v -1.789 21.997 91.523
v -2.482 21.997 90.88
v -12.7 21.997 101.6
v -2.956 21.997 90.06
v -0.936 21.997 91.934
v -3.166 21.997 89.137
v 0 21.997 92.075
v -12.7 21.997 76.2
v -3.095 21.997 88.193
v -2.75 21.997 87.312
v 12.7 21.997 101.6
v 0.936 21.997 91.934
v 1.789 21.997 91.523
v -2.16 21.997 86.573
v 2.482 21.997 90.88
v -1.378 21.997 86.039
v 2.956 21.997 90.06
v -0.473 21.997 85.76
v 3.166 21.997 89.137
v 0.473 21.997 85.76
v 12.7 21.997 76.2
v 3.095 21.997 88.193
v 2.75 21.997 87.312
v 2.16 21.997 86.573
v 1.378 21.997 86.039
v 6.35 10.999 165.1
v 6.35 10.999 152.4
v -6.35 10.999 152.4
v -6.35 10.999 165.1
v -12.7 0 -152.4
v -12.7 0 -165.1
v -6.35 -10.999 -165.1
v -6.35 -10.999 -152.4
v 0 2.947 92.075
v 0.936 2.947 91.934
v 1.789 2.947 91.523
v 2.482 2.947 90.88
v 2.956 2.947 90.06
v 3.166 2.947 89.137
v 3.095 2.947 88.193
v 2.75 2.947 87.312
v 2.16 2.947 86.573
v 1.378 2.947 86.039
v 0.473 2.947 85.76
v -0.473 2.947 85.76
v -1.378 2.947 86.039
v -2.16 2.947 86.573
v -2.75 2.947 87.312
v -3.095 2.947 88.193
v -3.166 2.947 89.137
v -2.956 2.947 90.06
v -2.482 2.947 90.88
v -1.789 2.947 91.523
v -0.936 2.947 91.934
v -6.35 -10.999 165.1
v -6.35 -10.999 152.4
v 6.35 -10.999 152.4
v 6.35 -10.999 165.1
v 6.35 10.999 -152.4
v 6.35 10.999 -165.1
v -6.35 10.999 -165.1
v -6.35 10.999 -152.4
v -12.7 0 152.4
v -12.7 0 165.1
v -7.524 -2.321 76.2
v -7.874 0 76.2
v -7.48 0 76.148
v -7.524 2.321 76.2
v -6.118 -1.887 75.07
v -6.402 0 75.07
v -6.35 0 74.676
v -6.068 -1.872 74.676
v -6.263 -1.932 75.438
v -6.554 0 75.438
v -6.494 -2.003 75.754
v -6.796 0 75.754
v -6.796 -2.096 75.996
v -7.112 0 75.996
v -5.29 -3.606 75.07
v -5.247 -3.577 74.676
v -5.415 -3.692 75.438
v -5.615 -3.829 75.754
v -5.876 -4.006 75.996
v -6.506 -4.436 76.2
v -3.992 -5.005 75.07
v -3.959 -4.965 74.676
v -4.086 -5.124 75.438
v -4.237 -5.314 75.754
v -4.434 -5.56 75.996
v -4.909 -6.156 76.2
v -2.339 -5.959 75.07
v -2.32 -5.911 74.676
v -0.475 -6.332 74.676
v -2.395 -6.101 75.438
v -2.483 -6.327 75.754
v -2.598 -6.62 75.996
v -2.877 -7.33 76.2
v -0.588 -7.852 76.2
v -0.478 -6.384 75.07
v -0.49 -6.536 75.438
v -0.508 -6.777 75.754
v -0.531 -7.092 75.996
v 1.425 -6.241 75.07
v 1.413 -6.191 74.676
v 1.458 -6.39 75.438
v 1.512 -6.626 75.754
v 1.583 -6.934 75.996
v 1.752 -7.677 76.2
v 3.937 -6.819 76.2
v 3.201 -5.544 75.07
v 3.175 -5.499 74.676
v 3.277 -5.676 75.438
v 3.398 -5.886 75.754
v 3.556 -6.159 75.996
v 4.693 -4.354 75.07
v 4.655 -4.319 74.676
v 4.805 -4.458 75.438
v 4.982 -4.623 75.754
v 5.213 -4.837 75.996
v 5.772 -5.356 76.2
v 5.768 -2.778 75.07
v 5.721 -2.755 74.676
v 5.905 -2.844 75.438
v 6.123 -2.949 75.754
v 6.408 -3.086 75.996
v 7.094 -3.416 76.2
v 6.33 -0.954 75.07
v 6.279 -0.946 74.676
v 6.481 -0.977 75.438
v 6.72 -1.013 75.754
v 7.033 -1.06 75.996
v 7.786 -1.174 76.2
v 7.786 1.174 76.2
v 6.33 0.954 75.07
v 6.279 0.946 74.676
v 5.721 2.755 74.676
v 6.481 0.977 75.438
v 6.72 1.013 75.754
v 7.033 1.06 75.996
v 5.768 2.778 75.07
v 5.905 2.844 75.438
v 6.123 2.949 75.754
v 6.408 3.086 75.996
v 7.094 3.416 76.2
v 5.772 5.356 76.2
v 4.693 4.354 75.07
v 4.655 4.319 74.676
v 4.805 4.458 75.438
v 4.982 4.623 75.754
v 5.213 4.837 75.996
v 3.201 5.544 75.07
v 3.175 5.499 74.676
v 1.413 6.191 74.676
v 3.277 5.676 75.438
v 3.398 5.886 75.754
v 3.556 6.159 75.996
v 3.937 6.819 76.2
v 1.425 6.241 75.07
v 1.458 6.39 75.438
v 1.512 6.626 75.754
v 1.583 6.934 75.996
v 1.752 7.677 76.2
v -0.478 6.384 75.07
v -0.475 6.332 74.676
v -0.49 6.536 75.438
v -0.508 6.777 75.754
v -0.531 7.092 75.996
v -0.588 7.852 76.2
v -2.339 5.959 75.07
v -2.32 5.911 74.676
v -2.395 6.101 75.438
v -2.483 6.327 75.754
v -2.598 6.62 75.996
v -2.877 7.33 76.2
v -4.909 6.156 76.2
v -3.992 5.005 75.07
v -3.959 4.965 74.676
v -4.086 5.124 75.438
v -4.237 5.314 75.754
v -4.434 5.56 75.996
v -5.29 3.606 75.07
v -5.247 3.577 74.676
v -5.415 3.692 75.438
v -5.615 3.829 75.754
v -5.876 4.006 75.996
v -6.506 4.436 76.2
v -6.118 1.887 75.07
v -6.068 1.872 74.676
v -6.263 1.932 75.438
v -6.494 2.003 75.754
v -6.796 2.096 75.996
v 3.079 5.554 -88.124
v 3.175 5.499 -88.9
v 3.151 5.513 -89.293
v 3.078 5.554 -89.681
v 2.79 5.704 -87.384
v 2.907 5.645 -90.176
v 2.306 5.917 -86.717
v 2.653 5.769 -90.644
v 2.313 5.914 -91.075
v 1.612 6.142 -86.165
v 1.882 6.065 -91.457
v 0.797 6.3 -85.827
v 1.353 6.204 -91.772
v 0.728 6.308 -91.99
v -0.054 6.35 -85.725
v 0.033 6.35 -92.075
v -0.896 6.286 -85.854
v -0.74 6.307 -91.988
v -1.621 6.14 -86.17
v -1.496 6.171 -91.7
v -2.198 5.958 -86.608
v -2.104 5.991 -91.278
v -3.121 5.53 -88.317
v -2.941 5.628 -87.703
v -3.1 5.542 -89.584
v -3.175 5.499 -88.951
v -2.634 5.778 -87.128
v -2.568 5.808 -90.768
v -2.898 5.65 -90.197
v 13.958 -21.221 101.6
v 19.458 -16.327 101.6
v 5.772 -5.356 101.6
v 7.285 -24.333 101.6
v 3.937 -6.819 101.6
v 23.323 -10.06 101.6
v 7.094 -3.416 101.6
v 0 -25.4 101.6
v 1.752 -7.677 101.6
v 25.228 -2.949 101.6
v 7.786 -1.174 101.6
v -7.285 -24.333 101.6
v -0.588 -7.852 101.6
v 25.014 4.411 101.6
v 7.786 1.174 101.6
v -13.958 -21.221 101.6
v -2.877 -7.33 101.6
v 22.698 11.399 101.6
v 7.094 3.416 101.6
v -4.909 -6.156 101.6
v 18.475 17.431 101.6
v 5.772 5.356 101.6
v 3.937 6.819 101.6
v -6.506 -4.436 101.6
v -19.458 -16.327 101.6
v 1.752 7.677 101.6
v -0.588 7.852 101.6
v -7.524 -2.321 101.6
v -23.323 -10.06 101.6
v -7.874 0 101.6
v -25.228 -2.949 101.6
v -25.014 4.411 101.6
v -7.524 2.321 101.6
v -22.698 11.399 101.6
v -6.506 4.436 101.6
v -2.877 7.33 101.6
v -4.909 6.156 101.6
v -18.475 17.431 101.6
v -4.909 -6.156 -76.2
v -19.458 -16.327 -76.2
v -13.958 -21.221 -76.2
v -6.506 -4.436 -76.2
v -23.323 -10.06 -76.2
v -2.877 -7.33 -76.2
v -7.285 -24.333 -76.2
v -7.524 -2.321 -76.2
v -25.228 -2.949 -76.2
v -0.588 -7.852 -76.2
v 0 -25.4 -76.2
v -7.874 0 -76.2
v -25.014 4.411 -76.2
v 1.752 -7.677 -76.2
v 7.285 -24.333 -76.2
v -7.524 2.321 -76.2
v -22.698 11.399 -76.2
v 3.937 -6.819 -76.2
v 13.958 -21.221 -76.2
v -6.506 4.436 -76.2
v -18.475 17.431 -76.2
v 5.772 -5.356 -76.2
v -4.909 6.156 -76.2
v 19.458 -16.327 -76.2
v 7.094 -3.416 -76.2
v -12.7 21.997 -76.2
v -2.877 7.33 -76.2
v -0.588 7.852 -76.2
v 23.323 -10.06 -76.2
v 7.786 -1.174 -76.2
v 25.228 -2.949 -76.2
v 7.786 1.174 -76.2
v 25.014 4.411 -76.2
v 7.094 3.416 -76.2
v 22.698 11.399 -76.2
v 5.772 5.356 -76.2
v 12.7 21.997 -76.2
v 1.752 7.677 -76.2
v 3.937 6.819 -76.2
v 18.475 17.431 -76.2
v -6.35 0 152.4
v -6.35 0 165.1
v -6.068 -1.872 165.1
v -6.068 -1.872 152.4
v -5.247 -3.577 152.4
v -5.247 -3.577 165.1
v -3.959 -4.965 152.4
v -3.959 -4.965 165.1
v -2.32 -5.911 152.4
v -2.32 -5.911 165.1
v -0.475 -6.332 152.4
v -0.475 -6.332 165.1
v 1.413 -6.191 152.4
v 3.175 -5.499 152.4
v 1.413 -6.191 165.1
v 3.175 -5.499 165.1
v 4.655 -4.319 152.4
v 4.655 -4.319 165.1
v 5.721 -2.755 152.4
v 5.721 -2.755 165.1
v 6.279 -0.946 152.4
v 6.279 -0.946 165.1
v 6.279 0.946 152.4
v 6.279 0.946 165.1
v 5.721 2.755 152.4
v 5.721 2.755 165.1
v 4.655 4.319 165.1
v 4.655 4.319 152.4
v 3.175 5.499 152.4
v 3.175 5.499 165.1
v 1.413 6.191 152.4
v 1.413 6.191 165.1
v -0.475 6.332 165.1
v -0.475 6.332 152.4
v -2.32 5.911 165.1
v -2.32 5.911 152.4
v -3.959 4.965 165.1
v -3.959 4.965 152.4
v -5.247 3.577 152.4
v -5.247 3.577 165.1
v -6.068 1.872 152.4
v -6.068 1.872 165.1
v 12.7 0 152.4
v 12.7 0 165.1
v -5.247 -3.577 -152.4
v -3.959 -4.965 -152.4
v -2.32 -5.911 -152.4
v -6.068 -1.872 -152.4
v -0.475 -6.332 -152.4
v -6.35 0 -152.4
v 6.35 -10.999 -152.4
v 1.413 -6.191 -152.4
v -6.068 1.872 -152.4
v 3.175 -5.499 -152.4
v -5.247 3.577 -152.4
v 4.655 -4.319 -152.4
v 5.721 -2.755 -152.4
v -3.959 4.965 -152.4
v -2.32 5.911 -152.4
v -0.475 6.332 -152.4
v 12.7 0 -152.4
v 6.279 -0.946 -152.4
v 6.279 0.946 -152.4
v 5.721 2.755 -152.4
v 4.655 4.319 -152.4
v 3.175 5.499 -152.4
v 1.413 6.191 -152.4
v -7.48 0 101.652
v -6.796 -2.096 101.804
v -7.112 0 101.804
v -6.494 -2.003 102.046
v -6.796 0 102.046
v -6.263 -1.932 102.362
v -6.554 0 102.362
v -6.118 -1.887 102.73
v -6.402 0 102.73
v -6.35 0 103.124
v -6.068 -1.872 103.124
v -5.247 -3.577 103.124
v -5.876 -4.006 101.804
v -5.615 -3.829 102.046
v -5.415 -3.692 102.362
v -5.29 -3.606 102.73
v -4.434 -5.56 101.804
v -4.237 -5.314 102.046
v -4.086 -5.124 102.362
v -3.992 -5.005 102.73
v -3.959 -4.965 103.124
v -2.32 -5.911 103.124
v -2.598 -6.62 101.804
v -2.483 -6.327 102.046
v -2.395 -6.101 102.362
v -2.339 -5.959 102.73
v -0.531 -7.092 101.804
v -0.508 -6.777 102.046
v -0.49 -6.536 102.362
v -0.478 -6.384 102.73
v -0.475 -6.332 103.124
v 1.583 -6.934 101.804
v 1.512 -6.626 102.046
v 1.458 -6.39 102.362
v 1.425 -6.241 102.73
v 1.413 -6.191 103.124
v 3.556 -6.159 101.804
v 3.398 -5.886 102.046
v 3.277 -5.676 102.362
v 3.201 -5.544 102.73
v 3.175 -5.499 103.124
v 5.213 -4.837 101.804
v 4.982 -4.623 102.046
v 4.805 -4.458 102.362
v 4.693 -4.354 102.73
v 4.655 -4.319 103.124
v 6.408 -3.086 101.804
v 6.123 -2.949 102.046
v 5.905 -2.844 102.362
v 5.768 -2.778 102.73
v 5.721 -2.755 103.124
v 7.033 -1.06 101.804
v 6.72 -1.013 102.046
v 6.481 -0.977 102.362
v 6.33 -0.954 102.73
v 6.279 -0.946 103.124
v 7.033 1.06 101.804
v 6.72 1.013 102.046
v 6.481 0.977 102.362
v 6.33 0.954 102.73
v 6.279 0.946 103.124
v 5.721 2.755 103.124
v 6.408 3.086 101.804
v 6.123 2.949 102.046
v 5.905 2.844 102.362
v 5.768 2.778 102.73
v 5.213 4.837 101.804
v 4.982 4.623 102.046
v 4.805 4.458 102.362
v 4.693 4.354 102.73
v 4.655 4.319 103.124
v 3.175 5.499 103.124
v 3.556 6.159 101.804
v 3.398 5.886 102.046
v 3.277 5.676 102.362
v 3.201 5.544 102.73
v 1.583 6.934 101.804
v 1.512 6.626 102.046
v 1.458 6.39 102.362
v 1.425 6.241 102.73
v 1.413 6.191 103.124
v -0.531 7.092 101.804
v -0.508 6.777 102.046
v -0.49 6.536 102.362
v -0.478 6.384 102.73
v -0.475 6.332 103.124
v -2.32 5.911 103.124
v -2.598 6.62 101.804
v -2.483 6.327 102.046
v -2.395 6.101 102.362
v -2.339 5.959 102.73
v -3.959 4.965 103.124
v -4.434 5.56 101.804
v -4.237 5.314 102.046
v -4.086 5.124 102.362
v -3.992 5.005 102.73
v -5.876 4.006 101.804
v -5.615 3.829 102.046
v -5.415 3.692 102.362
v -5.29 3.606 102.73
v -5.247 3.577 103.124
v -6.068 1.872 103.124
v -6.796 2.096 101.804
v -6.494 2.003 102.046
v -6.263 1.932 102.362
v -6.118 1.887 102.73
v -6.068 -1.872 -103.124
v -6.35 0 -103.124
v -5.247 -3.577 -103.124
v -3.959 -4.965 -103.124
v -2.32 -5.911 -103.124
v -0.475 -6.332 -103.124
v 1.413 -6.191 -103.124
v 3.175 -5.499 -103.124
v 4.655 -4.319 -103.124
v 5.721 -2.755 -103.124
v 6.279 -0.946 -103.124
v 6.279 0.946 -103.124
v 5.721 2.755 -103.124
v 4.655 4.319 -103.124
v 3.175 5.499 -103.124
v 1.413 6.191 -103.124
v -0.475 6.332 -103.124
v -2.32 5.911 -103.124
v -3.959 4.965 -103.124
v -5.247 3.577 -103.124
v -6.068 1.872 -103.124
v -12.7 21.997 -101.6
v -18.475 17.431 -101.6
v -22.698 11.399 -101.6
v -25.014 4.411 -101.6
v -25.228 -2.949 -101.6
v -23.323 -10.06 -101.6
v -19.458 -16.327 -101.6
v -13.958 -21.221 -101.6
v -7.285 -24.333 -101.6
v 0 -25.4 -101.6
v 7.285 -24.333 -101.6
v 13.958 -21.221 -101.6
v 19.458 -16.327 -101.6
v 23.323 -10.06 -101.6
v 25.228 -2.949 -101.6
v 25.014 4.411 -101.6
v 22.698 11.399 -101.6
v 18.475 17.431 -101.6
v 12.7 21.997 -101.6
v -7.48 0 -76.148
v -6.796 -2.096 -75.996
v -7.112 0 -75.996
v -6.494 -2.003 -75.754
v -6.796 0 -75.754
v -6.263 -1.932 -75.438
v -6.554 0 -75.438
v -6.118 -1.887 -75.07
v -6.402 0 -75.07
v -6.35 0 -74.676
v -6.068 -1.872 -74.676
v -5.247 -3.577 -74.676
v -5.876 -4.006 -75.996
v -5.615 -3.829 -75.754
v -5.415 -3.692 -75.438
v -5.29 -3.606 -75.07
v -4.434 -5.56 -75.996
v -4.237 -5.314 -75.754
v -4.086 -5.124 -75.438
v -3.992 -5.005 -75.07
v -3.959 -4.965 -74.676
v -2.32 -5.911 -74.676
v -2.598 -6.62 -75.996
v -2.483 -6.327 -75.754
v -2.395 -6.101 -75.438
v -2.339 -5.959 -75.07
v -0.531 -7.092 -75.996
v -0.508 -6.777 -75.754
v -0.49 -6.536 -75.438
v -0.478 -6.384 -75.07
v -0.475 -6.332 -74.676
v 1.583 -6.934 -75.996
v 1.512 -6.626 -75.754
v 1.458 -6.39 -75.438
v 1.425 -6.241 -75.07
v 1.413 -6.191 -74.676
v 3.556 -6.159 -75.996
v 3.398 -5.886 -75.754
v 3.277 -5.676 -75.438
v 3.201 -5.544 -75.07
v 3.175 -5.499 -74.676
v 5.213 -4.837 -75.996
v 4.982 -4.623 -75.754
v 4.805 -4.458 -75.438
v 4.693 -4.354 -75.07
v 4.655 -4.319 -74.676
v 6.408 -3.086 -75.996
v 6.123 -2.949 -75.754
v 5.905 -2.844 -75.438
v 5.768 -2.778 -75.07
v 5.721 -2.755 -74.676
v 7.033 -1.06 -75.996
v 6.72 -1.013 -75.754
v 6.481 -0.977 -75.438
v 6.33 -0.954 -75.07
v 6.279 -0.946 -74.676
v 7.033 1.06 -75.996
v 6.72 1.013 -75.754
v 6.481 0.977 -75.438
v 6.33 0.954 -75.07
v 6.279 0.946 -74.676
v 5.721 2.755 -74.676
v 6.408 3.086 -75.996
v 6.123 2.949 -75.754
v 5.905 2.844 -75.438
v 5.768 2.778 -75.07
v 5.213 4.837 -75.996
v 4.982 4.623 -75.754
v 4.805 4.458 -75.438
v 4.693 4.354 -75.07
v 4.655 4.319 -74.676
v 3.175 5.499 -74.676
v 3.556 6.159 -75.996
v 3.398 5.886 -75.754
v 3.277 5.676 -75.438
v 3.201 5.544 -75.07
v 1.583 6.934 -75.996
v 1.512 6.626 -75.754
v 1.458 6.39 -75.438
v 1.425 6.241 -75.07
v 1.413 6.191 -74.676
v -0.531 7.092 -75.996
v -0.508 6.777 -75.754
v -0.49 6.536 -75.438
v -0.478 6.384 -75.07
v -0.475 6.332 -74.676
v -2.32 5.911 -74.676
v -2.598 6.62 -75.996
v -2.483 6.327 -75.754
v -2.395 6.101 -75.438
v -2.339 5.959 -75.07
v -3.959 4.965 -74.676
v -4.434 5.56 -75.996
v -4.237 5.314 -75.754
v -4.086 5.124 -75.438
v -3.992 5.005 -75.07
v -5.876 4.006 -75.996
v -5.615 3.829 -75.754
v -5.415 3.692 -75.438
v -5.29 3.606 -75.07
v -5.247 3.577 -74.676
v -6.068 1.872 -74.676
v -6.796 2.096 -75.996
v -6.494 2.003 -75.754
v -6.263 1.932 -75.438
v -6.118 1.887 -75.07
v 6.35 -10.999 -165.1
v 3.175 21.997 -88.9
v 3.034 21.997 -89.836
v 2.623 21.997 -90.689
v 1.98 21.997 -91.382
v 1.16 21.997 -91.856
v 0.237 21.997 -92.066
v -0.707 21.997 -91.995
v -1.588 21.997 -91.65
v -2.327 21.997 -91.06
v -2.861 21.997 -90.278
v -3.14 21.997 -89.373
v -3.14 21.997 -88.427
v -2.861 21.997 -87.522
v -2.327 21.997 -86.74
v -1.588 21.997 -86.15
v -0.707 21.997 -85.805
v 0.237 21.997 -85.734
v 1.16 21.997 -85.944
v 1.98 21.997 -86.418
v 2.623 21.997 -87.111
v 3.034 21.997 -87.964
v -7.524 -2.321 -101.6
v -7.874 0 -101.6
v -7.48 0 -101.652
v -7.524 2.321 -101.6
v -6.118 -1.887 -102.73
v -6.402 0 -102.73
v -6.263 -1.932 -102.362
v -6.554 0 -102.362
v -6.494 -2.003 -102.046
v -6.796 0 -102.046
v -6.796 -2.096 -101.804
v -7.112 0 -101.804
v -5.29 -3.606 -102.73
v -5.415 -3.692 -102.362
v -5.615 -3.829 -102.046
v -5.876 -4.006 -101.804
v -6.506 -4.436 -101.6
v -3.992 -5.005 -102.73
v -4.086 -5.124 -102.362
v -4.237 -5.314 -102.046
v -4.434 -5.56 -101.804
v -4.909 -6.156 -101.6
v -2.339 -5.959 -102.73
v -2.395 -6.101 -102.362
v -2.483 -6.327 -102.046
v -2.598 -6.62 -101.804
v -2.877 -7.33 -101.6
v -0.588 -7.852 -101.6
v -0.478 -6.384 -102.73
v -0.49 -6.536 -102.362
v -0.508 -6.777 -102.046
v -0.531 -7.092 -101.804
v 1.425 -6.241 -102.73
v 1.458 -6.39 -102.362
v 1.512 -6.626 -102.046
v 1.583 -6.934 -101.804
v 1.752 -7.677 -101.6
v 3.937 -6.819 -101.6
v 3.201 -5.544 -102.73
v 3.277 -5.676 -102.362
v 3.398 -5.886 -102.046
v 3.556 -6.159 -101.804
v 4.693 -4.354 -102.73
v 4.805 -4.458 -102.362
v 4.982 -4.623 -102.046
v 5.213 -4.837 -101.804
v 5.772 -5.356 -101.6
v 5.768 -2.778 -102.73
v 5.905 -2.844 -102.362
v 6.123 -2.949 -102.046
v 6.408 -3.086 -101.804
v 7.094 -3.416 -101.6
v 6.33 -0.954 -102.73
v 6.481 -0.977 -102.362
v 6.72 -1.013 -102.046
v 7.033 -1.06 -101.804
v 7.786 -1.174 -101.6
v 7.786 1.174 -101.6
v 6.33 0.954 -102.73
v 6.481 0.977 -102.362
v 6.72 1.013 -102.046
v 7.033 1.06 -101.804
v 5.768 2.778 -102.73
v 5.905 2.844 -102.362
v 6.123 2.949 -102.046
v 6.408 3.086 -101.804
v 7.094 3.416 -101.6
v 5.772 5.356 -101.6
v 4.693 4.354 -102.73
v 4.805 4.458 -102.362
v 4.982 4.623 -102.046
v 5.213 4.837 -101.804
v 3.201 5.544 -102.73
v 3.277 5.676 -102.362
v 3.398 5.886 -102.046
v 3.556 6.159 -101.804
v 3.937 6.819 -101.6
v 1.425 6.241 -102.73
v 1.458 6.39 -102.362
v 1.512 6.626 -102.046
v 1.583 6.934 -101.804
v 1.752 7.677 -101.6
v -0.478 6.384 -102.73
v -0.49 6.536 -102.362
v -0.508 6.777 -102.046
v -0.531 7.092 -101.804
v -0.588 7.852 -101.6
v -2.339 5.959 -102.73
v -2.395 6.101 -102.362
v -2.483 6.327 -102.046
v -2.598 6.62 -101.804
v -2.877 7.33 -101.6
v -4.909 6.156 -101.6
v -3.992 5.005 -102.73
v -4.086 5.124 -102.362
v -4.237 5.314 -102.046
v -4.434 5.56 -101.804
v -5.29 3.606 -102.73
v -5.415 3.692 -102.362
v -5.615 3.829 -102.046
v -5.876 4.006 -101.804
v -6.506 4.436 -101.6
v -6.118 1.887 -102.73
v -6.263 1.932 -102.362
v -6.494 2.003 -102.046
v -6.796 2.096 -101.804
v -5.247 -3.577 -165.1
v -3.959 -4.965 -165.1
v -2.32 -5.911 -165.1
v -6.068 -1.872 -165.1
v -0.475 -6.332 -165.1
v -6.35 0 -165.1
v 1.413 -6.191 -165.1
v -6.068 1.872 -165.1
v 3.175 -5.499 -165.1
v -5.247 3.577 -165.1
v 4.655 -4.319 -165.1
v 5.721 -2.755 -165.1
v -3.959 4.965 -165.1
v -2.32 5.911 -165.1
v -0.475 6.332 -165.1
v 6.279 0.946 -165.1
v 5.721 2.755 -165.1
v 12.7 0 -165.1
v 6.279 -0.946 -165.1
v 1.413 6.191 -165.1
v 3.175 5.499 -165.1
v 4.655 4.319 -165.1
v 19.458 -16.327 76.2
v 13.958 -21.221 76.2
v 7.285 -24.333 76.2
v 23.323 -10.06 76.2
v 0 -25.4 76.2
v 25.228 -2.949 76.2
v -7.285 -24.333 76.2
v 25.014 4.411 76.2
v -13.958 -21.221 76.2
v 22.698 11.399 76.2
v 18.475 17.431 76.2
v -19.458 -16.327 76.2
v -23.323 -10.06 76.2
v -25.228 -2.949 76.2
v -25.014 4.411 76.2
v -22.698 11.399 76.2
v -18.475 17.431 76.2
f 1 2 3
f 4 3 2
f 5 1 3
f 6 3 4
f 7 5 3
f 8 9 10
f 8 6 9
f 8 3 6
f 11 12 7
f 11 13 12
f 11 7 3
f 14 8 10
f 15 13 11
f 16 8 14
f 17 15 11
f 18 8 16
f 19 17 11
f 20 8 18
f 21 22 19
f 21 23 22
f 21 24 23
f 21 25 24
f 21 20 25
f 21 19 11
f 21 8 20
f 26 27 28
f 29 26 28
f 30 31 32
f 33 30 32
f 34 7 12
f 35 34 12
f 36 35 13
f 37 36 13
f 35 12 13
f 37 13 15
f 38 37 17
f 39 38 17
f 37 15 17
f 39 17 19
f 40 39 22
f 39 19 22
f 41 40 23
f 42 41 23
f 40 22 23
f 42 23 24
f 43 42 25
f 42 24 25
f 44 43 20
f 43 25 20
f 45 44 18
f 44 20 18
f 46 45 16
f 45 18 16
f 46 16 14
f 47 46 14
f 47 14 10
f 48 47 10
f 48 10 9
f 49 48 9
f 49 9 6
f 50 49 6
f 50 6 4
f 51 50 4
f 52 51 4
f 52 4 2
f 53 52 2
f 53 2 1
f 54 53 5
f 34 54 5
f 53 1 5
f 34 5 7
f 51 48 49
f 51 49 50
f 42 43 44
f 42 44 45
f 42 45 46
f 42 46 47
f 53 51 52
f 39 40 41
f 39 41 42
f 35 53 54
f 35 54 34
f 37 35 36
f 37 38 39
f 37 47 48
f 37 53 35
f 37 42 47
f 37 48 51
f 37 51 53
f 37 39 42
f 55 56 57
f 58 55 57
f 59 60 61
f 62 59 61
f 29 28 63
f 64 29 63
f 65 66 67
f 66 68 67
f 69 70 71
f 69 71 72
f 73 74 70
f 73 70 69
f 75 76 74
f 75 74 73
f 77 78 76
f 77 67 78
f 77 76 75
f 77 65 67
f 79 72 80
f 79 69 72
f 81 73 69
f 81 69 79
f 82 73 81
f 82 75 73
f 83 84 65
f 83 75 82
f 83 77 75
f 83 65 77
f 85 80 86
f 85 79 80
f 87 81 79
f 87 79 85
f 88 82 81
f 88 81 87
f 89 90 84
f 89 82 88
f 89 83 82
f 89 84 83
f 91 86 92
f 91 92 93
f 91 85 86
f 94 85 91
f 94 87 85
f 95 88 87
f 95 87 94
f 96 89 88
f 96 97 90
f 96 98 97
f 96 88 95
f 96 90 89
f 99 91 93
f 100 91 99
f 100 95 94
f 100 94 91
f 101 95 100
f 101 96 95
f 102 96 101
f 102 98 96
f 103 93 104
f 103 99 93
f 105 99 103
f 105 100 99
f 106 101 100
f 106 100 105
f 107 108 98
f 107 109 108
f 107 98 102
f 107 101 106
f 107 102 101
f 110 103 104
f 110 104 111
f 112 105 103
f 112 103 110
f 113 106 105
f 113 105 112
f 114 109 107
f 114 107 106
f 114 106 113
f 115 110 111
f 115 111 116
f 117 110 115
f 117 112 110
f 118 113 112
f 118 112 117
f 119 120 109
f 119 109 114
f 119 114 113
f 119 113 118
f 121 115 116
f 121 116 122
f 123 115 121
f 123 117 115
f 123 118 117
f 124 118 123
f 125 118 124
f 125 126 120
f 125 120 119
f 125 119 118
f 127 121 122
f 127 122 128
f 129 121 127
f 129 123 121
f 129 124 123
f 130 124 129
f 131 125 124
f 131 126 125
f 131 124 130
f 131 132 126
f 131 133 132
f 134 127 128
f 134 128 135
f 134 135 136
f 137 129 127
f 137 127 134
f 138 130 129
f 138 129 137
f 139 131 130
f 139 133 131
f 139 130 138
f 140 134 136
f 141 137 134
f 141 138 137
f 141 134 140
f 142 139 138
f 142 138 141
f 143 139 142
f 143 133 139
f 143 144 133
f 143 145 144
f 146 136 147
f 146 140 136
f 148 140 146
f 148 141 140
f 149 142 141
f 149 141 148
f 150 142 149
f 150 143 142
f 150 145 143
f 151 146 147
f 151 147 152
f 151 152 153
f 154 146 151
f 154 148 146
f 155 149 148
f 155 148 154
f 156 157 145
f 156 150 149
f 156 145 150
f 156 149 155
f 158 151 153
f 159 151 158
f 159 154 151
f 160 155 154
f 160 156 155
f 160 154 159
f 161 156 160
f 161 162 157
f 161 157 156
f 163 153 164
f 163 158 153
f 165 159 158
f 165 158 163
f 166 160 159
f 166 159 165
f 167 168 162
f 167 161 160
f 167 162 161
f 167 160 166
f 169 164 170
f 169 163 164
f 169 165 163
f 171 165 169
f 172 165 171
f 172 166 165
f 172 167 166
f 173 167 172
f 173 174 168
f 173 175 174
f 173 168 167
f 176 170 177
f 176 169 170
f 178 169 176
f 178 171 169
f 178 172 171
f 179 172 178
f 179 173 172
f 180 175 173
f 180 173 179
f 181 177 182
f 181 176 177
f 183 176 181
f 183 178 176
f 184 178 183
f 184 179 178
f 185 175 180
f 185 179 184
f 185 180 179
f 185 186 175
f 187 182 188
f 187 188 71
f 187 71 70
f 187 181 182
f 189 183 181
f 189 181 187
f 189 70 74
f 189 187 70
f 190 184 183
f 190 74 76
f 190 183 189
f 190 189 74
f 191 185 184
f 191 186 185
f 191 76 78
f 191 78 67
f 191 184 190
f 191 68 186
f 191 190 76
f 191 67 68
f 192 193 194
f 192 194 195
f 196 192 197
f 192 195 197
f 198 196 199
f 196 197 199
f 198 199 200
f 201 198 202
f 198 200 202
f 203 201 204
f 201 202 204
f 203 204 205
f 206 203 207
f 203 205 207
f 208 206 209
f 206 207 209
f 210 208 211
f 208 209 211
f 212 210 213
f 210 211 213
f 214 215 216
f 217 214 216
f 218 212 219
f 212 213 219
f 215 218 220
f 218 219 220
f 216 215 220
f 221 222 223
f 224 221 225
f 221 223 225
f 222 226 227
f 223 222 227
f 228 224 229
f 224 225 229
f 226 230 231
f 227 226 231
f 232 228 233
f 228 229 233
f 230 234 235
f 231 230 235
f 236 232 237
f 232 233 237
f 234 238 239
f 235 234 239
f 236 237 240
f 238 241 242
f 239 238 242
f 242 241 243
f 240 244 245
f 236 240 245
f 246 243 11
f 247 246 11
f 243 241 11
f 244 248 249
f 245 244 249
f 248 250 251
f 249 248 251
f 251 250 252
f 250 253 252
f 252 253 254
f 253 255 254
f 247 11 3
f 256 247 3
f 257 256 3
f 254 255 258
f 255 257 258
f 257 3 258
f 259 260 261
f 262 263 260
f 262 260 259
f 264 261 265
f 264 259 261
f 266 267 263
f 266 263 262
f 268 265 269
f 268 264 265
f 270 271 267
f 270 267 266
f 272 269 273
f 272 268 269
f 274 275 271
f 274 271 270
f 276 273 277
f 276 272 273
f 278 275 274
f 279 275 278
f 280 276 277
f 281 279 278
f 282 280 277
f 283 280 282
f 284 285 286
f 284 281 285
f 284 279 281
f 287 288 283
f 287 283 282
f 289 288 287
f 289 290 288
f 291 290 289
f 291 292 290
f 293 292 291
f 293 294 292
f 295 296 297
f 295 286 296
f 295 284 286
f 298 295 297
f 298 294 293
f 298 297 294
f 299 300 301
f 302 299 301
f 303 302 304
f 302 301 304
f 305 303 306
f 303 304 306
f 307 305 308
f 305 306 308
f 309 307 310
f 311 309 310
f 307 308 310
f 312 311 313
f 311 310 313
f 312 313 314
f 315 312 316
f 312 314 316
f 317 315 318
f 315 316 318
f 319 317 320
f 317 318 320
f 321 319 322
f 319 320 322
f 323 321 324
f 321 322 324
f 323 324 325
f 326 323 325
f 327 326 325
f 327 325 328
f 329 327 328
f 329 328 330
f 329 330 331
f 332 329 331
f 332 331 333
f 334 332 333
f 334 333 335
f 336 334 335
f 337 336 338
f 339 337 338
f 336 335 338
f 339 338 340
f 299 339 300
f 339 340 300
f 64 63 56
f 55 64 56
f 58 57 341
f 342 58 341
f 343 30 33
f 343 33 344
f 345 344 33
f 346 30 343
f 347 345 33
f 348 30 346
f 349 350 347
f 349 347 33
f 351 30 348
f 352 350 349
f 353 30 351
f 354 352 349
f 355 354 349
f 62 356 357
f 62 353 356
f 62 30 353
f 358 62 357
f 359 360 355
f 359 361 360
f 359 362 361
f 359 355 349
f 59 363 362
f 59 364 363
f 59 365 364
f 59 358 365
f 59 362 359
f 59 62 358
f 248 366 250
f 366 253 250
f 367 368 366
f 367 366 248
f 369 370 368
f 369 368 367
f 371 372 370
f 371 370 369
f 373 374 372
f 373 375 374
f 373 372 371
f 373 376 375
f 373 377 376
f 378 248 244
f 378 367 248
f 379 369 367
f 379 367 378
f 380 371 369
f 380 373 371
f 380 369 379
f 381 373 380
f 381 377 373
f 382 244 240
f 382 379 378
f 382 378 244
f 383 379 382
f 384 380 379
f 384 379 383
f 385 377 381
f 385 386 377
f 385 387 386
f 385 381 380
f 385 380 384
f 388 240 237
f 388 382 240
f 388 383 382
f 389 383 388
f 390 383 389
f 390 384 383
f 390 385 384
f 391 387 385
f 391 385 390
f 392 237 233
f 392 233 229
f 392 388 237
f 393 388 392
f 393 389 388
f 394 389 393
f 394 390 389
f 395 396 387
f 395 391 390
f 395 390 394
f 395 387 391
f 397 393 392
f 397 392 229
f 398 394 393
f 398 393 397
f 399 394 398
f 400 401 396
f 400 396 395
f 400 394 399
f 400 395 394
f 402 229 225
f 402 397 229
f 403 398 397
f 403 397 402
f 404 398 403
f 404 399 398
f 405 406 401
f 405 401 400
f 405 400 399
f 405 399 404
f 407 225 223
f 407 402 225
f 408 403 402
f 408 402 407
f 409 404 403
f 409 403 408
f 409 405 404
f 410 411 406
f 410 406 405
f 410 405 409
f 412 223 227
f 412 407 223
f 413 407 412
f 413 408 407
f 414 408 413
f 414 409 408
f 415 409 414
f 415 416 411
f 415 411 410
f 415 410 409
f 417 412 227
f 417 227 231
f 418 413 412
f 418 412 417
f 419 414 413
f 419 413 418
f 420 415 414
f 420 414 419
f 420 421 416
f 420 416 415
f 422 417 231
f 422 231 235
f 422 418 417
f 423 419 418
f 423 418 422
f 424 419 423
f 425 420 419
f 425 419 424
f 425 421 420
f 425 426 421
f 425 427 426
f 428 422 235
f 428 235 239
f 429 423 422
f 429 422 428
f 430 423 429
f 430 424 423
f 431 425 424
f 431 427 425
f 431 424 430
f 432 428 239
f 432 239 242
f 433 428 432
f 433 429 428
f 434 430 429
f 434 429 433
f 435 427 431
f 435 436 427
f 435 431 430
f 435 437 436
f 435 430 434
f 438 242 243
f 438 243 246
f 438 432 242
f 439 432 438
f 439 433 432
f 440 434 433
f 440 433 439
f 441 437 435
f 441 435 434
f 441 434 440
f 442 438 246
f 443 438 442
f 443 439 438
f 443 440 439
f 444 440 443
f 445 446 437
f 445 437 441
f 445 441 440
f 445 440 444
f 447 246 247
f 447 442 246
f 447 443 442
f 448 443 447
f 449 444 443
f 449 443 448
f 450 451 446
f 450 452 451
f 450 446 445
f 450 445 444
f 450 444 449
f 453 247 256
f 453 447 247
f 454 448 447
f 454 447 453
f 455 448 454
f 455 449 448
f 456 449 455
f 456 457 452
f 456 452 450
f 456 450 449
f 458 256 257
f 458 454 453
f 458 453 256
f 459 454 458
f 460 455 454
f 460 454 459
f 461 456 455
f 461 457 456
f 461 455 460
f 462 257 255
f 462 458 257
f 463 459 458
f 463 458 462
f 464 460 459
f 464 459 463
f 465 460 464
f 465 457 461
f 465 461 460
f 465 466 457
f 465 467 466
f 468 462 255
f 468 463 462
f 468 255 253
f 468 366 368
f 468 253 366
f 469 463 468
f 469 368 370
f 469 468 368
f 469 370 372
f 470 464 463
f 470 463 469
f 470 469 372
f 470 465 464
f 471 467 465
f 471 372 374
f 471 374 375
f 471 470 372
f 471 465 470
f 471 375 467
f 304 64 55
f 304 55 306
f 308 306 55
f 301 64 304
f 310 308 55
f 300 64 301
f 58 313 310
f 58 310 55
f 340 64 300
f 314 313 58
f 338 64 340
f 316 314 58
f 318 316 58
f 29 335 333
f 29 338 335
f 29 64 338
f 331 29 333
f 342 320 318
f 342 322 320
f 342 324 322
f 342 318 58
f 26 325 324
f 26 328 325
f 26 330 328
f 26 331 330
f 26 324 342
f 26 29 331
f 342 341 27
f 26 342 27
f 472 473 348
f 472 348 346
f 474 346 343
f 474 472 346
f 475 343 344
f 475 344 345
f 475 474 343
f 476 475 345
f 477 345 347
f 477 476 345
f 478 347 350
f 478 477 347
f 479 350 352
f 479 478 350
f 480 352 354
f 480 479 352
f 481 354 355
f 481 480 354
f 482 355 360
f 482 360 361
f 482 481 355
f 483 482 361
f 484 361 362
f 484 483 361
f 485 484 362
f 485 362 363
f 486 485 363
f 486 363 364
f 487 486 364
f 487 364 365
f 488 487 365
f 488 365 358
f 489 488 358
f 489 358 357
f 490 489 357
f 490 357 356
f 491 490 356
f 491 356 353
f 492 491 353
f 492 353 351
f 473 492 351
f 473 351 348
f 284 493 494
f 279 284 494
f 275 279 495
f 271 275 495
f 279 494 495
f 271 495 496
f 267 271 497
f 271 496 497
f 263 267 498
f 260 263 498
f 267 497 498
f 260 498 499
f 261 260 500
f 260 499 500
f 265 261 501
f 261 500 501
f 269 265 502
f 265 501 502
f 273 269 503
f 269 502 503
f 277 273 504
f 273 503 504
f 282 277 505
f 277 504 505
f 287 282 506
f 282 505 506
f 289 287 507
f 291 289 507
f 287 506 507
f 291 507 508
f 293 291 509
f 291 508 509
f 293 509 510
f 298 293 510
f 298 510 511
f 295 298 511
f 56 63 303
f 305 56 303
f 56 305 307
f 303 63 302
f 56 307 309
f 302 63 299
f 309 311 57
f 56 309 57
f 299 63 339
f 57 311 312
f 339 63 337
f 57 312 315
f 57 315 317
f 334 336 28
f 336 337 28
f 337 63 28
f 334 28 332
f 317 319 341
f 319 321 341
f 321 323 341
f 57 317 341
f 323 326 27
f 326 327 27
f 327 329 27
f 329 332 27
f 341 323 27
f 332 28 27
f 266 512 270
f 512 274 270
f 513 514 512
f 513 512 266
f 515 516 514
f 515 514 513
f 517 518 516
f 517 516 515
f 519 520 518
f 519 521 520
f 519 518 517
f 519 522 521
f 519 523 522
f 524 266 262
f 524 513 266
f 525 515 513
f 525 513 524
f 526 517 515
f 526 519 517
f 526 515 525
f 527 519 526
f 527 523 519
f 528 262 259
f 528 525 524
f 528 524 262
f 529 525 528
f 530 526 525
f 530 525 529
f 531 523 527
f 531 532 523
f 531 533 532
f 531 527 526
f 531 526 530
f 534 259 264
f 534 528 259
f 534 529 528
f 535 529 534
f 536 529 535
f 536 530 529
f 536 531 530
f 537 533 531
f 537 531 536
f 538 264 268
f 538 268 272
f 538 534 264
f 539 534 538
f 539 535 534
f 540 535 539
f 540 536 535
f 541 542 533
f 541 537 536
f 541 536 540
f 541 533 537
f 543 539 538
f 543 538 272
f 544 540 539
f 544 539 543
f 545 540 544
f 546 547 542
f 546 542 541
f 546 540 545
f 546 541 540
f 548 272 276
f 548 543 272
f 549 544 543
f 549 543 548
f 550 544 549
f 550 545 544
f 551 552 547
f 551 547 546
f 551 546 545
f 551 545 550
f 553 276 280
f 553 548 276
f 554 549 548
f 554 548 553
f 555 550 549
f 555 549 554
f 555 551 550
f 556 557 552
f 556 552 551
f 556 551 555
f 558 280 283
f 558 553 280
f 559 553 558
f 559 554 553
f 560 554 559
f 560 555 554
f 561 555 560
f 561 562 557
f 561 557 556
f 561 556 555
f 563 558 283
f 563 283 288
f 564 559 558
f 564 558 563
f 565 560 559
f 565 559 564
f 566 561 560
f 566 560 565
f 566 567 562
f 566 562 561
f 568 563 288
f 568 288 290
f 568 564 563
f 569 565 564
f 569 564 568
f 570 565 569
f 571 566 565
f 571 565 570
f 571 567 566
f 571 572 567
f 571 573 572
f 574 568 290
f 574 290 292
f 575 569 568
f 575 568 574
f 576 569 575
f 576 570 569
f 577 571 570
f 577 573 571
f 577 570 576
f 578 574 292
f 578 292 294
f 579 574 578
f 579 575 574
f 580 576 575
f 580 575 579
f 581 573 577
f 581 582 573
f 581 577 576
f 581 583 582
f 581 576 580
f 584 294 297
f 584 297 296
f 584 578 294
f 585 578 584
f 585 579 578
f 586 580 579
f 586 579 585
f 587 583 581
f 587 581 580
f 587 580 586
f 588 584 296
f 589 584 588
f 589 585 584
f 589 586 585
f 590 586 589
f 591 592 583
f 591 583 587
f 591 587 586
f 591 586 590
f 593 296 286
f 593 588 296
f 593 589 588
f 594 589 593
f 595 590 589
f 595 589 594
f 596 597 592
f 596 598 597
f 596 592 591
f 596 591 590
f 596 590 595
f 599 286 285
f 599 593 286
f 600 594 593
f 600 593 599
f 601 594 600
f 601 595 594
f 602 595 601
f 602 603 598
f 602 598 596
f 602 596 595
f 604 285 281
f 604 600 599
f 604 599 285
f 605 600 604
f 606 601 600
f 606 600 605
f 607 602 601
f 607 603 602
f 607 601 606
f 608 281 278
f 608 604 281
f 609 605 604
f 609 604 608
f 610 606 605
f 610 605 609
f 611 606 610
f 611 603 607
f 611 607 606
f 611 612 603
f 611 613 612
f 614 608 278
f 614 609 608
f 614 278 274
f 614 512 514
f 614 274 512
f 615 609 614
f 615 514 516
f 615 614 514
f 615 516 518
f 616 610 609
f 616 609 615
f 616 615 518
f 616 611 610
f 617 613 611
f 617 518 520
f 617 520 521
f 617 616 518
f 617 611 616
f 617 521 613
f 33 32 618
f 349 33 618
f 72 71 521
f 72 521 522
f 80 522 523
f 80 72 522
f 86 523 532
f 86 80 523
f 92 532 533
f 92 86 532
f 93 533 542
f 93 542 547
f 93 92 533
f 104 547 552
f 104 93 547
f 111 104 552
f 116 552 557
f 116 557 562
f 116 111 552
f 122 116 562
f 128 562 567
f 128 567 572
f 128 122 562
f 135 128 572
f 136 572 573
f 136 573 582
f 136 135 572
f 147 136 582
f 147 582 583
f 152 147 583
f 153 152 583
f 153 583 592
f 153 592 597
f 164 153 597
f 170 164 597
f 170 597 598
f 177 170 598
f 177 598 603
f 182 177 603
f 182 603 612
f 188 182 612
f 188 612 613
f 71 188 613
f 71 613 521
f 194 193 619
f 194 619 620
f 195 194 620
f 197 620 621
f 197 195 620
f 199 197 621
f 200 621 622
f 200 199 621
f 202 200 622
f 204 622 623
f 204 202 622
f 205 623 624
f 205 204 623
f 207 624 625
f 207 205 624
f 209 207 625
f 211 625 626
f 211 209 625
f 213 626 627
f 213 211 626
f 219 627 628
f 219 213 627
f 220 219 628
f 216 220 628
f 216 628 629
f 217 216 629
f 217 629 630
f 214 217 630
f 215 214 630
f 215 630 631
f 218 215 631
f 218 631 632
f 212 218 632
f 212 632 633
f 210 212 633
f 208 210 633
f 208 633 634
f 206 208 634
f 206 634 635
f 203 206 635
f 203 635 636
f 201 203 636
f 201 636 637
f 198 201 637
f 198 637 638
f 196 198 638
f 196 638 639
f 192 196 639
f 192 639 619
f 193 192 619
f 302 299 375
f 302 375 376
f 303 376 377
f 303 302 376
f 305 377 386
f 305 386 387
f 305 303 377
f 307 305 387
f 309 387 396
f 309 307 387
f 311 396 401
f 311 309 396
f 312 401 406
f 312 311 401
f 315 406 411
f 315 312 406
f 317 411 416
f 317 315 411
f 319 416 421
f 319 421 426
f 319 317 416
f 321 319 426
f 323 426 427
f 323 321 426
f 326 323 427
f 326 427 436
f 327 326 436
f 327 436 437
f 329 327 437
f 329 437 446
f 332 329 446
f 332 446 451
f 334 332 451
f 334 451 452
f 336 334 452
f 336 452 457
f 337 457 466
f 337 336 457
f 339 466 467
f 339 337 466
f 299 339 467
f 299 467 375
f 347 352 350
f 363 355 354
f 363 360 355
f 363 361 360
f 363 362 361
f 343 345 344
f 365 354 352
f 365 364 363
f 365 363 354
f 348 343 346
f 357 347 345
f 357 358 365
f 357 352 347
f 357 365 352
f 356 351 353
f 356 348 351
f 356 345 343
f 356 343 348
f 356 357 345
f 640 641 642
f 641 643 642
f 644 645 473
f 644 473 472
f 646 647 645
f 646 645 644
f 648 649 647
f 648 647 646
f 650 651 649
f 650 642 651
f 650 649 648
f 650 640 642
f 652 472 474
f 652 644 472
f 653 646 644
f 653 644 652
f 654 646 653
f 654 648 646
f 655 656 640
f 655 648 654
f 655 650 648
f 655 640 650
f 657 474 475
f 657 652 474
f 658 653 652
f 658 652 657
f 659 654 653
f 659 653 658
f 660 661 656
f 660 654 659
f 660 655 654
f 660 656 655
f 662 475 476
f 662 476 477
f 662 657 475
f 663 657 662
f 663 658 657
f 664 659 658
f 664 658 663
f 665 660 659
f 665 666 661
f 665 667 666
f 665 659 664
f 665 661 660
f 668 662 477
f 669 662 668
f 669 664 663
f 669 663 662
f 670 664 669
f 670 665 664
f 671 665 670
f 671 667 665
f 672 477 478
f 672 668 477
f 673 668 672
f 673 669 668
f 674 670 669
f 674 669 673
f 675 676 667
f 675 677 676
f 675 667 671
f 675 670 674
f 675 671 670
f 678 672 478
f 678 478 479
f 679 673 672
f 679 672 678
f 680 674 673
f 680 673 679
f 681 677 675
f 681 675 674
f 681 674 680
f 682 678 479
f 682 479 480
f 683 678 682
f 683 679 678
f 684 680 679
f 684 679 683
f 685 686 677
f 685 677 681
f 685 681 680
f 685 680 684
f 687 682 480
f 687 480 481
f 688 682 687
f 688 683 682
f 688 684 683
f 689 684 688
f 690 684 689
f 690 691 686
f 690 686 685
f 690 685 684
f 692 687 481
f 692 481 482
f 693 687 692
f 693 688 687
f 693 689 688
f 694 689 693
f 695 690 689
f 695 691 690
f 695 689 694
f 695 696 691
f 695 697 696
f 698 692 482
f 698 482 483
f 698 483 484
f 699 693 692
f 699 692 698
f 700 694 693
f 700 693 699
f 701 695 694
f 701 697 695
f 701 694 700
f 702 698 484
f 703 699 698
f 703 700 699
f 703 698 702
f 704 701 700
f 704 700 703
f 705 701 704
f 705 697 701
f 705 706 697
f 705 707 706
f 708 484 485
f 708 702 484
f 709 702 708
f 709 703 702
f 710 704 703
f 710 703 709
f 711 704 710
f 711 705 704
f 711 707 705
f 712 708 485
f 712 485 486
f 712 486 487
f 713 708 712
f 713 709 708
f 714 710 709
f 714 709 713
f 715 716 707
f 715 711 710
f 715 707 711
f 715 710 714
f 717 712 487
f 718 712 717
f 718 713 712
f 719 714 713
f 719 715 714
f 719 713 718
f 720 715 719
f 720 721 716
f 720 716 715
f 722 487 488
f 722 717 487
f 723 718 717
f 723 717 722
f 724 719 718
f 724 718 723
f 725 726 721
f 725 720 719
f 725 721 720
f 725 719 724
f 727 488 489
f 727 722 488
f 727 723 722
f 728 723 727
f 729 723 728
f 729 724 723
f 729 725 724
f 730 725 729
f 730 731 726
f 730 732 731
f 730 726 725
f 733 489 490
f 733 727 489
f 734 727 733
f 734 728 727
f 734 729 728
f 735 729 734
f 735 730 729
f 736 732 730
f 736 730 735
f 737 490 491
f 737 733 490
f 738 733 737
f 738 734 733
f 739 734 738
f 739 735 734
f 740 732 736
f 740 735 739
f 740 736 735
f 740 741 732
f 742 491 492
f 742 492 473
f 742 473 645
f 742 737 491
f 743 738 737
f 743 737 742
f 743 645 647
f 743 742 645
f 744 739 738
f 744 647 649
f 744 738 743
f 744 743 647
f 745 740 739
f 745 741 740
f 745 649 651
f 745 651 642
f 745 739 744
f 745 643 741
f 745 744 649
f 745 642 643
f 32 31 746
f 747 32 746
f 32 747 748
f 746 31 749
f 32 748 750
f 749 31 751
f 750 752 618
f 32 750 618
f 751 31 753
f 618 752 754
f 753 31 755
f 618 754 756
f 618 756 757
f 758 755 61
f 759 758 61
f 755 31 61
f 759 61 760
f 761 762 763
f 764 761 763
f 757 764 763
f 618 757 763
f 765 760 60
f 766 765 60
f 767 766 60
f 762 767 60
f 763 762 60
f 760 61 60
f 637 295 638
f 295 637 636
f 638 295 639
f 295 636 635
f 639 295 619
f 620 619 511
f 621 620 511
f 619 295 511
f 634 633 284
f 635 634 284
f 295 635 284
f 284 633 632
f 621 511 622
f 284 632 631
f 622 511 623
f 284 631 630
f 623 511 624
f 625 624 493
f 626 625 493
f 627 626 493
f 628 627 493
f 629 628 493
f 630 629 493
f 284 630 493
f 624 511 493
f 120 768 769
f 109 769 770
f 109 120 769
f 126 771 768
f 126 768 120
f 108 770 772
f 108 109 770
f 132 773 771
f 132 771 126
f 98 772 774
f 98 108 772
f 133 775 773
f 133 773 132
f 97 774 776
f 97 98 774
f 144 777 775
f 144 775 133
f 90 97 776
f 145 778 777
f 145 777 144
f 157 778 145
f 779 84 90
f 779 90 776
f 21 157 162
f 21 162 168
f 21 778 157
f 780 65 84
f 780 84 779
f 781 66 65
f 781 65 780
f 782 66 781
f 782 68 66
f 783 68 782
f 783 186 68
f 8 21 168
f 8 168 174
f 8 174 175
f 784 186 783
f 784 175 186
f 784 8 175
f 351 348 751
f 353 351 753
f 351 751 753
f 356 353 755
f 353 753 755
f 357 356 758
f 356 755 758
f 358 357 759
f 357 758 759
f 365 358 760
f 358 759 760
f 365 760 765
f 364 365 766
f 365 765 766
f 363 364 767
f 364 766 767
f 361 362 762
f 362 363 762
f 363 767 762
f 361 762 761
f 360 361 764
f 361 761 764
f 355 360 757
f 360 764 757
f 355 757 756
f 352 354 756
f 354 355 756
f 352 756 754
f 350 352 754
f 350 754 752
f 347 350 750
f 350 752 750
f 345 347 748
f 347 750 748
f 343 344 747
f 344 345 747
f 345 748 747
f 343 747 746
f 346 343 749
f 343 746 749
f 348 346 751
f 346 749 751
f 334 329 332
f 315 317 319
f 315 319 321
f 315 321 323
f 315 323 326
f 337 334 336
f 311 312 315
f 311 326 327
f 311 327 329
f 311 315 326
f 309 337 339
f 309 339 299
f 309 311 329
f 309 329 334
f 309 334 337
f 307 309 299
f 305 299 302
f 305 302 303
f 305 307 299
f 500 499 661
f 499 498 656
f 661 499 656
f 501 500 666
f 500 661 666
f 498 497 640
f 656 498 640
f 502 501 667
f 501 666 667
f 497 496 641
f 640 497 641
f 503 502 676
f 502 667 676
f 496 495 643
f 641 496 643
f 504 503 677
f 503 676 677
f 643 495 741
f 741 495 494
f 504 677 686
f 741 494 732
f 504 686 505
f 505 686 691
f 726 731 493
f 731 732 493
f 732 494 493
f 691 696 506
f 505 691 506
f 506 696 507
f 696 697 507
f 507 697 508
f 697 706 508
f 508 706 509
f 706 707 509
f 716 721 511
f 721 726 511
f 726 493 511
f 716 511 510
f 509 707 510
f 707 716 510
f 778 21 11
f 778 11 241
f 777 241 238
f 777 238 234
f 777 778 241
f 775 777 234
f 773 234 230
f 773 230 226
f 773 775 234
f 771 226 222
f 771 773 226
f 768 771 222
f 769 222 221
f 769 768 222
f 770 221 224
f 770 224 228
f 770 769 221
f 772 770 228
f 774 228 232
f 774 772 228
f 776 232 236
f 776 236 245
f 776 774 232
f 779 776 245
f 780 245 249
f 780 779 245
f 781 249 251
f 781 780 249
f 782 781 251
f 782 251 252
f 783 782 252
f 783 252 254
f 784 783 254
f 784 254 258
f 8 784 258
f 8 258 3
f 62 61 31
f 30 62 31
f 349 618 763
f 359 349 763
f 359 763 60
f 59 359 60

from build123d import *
from OCP.BRepAlgoAPI import BRepAlgoAPI_Cut
from OCP.TopTools import TopTools_ListOfShape

# Parameters (mm, degrees)
SKETCH1_R           = 6.35
BOSS_EXTRUDE1_DEPTH = 152.4
BOSS_EXTRUDE2_DEPTH = 12.7
SKETCH3_R           = 6.35
CUT_EXTRUDE1_DEPTH  = 12.7
BOSS_EXTRUDE3_DEPTH = 25.4
SKETCH5_R           = 3.175
CUT_EXTRUDE2_DEPTH  = 19.05
MIRROR1_START       = -101.6
MIRROR1_OUTLINE_R   = 6.35
MIRROR1_DEPTH       = 25.4
MIRROR1_START_2     = -165.1
MIRROR1_2_DEPTH     = 12.7
MIRROR1_START_3     = 5.499260123
MIRROR1_3_OUTLINE_R = 3.175
MIRROR1_3_DEPTH     = 16.497785133
MIRROR1_START_4     = -93
MIRROR1_4_DEPTH     = 7.275
FILLET1_R           = 1.524
SKETCH6_R           = 6.35
CUT_EXTRUDE5_DEPTH  = 12.7


with BuildPart() as part:
    # Sketch1 → Boss-Extrude1 (new, symmetric)
    with BuildSketch(Plane.XY):
        with Locations(Location((0, 0, 0), (0, 0, 180))):
            Circle(SKETCH1_R)
    extrude(amount=BOSS_EXTRUDE1_DEPTH, both=True)

    # Sketch2 → Boss-Extrude2 (add)
    with BuildSketch(Plane.XY.offset(152.4)):
        Polygon((6.35, -10.998522628), (12.7, 0), (6.35, 10.998522628), (-6.35, 10.998522628), (-12.7, 0), (-6.35, -10.998522628), align=None)
    extrude(amount=BOSS_EXTRUDE2_DEPTH)

    # Sketch3 → Cut-Extrude1 (cut)
    with BuildSketch(Plane.XY.offset(165.1)):
        with Locations(Location((0, 0, 0), (0, 0, 180))):
            Circle(SKETCH3_R)
    extrude(amount=-CUT_EXTRUDE1_DEPTH, mode=Mode.SUBTRACT)


with BuildPart() as cut_extrude1_piece_1:
    # of the separate pieces the step leaves, piece 1, a body of its own (cut_extrude1_pieces)
    add(part.part.solids().sort_by_distance((-6.35, 0, -152.4))[0])

    # Sketch4 → Boss-Extrude3 (add)
    with BuildSketch(Plane.XY.offset(76.2)):
        with BuildLine():
            Line((-12.7, 21.997045256), (12.7, 21.997045256))
            ThreePointArc((12.7, 21.997045256), (0, -25.4), (-12.7, 21.997045256))
        make_face()
    extrude(amount=BOSS_EXTRUDE3_DEPTH)

    # Sketch5 → Cut-Extrude2 (cut)
    with BuildSketch(Plane(origin=(0, 21.997045256, 0), x_dir=(1, 0, 0), z_dir=(0, 1, 0))):
        with Locations(Location((0, -88.9, 0), (0, 0, 270))):
            Circle(SKETCH5_R)
    extrude(amount=-CUT_EXTRUDE2_DEPTH, mode=Mode.SUBTRACT)


with BuildPart() as cut_extrude1_piece_2:
    # of the separate pieces the step leaves, piece 2, a body of its own (cut_extrude1_pieces)
    add(part.part.solids().sort_by_distance((6.35, -10.998522628, 152.4))[0])


with BuildPart() as mirror1_tool:
    # Mirror1: read off the stored shape, not the designer's step
    # Mirror1 outline → Mirror1 (new body)
    with BuildSketch(Plane.XY.offset(MIRROR1_START)):
        with BuildLine():
            Line((12.7, 21.997045256), (-12.7, 21.997045256))
            ThreePointArc((-12.7, 21.997045256), (0, -25.4), (12.7, 21.997045256))
        make_face()
        Circle(MIRROR1_OUTLINE_R, mode=Mode.SUBTRACT)
    extrude(amount=MIRROR1_DEPTH)


with BuildPart() as cut_extrude1_piece_1_1:
    add(cut_extrude1_piece_1.part)


with BuildPart() as cut_extrude1_piece_1_2:
    # Mirror1: joined with mirror1_tool
    add(cut_extrude1_piece_1_1.part.fuse(mirror1_tool.part, tol=0.00001))


with BuildPart() as mirror1_2_tool:
    # Mirror1 2 outline → Mirror1 2 (new body)
    with BuildSketch(Plane.XY.offset(MIRROR1_START_2)):
        Polygon((-12.7, 0), (-6.35, -10.998522628), (6.35, -10.998522628), (12.7, 0), (6.35, 10.998522628), (-6.35, 10.998522628), align=None)
    extrude(amount=MIRROR1_2_DEPTH)


with BuildPart() as cut_extrude1_piece_1_3:
    add(cut_extrude1_piece_1_2.part)


with BuildPart() as cut_extrude1_piece_1_4:
    # Mirror1 2: joined with mirror1_2_tool
    add(cut_extrude1_piece_1_3.part.fuse(mirror1_2_tool.part, tol=0.00001))


with BuildPart() as mirror1_3_tool:
    # Mirror1 3 outline → Mirror1 3 (new body)
    with BuildSketch(Plane(origin=(0, 0, 0), x_dir=(1, 0, 0), z_dir=(0, 1, 0)).offset(MIRROR1_START_3)):
        with Locations((0, 88.9)):
            Circle(MIRROR1_3_OUTLINE_R)
    extrude(amount=MIRROR1_3_DEPTH)


with BuildPart() as cut_extrude1_piece_1_5:
    add(cut_extrude1_piece_1_4.part)

    # Mirror1 3: cut by mirror1_3_tool, with a tolerance
    mirror1_3_stock = TopTools_ListOfShape()
    mirror1_3_stock.Append(cut_extrude1_piece_1_5.part.wrapped)
    mirror1_3_tools = TopTools_ListOfShape()
    mirror1_3_tools.Append(mirror1_3_tool.part.wrapped)
    mirror1_3_cut = BRepAlgoAPI_Cut()
    mirror1_3_cut.SetArguments(mirror1_3_stock)
    mirror1_3_cut.SetTools(mirror1_3_tools)
    mirror1_3_cut.SetFuzzyValue(0.00001)
    mirror1_3_cut.Build()
    add(Compound.cast(mirror1_3_cut.Shape()).solids(), mode=Mode.REPLACE)


with BuildPart() as mirror1_4_tool:
    # Mirror1 4 outline → Mirror1 4 (new body)
    with BuildSketch(Plane.XY.offset(MIRROR1_START_4)):
        with BuildLine():
            ThreePointArc((3.175000516, 5.499261016), (0, 6.35), (-3.175000515, 5.499261016))
            Line((-3.175000515, 5.499261016), (3.175000516, 5.499261016))
        make_face()
    extrude(amount=MIRROR1_4_DEPTH)


with BuildPart() as cut_extrude1_piece_1_6:
    add(cut_extrude1_piece_1_5.part)


with BuildPart() as cut_extrude1_piece_1_7:
    # Mirror1 4: joined with mirror1_4_tool
    add(cut_extrude1_piece_1_6.part.fuse(mirror1_4_tool.part, tol=0.00001))

    # Fillet1
    fillet1_edges = [cut_extrude1_piece_1_7.edges().sort_by_distance(p)[0] for p in [
        (6.35, 0, -76.2),
        (6.35, 0, -101.6),
        (6.35, 0, 76.2),
        (6.35, 0, 101.6),
    ]]
    fillet(fillet1_edges, radius=FILLET1_R)

    # Sketch6 → Cut-Extrude5 (cut)
    with BuildSketch(Plane(origin=(0, 0, -165.1), x_dir=(-1, 0, 0), z_dir=(0, 0, -1))):
        Circle(SKETCH6_R)
    extrude(amount=-CUT_EXTRUDE5_DEPTH, mode=Mode.SUBTRACT)


with BuildPart() as cut_extrude5_piece_1:
    # of the separate pieces the step leaves, piece 1, a body of its own (cut_extrude5_pieces)
    add(cut_extrude1_piece_1_7.part.solids().sort_by_distance((-6.35, 0, -103.124))[0])


with BuildPart() as cut_extrude5_piece_2:
    # of the separate pieces the step leaves, piece 2, a body of its own (cut_extrude5_pieces)
    add(cut_extrude1_piece_1_7.part.solids().sort_by_distance((-12.7, 0, -152.4))[0])


solid = Compound([cut_extrude1_piece_2.part, cut_extrude5_piece_1.part, cut_extrude5_piece_2.part])
